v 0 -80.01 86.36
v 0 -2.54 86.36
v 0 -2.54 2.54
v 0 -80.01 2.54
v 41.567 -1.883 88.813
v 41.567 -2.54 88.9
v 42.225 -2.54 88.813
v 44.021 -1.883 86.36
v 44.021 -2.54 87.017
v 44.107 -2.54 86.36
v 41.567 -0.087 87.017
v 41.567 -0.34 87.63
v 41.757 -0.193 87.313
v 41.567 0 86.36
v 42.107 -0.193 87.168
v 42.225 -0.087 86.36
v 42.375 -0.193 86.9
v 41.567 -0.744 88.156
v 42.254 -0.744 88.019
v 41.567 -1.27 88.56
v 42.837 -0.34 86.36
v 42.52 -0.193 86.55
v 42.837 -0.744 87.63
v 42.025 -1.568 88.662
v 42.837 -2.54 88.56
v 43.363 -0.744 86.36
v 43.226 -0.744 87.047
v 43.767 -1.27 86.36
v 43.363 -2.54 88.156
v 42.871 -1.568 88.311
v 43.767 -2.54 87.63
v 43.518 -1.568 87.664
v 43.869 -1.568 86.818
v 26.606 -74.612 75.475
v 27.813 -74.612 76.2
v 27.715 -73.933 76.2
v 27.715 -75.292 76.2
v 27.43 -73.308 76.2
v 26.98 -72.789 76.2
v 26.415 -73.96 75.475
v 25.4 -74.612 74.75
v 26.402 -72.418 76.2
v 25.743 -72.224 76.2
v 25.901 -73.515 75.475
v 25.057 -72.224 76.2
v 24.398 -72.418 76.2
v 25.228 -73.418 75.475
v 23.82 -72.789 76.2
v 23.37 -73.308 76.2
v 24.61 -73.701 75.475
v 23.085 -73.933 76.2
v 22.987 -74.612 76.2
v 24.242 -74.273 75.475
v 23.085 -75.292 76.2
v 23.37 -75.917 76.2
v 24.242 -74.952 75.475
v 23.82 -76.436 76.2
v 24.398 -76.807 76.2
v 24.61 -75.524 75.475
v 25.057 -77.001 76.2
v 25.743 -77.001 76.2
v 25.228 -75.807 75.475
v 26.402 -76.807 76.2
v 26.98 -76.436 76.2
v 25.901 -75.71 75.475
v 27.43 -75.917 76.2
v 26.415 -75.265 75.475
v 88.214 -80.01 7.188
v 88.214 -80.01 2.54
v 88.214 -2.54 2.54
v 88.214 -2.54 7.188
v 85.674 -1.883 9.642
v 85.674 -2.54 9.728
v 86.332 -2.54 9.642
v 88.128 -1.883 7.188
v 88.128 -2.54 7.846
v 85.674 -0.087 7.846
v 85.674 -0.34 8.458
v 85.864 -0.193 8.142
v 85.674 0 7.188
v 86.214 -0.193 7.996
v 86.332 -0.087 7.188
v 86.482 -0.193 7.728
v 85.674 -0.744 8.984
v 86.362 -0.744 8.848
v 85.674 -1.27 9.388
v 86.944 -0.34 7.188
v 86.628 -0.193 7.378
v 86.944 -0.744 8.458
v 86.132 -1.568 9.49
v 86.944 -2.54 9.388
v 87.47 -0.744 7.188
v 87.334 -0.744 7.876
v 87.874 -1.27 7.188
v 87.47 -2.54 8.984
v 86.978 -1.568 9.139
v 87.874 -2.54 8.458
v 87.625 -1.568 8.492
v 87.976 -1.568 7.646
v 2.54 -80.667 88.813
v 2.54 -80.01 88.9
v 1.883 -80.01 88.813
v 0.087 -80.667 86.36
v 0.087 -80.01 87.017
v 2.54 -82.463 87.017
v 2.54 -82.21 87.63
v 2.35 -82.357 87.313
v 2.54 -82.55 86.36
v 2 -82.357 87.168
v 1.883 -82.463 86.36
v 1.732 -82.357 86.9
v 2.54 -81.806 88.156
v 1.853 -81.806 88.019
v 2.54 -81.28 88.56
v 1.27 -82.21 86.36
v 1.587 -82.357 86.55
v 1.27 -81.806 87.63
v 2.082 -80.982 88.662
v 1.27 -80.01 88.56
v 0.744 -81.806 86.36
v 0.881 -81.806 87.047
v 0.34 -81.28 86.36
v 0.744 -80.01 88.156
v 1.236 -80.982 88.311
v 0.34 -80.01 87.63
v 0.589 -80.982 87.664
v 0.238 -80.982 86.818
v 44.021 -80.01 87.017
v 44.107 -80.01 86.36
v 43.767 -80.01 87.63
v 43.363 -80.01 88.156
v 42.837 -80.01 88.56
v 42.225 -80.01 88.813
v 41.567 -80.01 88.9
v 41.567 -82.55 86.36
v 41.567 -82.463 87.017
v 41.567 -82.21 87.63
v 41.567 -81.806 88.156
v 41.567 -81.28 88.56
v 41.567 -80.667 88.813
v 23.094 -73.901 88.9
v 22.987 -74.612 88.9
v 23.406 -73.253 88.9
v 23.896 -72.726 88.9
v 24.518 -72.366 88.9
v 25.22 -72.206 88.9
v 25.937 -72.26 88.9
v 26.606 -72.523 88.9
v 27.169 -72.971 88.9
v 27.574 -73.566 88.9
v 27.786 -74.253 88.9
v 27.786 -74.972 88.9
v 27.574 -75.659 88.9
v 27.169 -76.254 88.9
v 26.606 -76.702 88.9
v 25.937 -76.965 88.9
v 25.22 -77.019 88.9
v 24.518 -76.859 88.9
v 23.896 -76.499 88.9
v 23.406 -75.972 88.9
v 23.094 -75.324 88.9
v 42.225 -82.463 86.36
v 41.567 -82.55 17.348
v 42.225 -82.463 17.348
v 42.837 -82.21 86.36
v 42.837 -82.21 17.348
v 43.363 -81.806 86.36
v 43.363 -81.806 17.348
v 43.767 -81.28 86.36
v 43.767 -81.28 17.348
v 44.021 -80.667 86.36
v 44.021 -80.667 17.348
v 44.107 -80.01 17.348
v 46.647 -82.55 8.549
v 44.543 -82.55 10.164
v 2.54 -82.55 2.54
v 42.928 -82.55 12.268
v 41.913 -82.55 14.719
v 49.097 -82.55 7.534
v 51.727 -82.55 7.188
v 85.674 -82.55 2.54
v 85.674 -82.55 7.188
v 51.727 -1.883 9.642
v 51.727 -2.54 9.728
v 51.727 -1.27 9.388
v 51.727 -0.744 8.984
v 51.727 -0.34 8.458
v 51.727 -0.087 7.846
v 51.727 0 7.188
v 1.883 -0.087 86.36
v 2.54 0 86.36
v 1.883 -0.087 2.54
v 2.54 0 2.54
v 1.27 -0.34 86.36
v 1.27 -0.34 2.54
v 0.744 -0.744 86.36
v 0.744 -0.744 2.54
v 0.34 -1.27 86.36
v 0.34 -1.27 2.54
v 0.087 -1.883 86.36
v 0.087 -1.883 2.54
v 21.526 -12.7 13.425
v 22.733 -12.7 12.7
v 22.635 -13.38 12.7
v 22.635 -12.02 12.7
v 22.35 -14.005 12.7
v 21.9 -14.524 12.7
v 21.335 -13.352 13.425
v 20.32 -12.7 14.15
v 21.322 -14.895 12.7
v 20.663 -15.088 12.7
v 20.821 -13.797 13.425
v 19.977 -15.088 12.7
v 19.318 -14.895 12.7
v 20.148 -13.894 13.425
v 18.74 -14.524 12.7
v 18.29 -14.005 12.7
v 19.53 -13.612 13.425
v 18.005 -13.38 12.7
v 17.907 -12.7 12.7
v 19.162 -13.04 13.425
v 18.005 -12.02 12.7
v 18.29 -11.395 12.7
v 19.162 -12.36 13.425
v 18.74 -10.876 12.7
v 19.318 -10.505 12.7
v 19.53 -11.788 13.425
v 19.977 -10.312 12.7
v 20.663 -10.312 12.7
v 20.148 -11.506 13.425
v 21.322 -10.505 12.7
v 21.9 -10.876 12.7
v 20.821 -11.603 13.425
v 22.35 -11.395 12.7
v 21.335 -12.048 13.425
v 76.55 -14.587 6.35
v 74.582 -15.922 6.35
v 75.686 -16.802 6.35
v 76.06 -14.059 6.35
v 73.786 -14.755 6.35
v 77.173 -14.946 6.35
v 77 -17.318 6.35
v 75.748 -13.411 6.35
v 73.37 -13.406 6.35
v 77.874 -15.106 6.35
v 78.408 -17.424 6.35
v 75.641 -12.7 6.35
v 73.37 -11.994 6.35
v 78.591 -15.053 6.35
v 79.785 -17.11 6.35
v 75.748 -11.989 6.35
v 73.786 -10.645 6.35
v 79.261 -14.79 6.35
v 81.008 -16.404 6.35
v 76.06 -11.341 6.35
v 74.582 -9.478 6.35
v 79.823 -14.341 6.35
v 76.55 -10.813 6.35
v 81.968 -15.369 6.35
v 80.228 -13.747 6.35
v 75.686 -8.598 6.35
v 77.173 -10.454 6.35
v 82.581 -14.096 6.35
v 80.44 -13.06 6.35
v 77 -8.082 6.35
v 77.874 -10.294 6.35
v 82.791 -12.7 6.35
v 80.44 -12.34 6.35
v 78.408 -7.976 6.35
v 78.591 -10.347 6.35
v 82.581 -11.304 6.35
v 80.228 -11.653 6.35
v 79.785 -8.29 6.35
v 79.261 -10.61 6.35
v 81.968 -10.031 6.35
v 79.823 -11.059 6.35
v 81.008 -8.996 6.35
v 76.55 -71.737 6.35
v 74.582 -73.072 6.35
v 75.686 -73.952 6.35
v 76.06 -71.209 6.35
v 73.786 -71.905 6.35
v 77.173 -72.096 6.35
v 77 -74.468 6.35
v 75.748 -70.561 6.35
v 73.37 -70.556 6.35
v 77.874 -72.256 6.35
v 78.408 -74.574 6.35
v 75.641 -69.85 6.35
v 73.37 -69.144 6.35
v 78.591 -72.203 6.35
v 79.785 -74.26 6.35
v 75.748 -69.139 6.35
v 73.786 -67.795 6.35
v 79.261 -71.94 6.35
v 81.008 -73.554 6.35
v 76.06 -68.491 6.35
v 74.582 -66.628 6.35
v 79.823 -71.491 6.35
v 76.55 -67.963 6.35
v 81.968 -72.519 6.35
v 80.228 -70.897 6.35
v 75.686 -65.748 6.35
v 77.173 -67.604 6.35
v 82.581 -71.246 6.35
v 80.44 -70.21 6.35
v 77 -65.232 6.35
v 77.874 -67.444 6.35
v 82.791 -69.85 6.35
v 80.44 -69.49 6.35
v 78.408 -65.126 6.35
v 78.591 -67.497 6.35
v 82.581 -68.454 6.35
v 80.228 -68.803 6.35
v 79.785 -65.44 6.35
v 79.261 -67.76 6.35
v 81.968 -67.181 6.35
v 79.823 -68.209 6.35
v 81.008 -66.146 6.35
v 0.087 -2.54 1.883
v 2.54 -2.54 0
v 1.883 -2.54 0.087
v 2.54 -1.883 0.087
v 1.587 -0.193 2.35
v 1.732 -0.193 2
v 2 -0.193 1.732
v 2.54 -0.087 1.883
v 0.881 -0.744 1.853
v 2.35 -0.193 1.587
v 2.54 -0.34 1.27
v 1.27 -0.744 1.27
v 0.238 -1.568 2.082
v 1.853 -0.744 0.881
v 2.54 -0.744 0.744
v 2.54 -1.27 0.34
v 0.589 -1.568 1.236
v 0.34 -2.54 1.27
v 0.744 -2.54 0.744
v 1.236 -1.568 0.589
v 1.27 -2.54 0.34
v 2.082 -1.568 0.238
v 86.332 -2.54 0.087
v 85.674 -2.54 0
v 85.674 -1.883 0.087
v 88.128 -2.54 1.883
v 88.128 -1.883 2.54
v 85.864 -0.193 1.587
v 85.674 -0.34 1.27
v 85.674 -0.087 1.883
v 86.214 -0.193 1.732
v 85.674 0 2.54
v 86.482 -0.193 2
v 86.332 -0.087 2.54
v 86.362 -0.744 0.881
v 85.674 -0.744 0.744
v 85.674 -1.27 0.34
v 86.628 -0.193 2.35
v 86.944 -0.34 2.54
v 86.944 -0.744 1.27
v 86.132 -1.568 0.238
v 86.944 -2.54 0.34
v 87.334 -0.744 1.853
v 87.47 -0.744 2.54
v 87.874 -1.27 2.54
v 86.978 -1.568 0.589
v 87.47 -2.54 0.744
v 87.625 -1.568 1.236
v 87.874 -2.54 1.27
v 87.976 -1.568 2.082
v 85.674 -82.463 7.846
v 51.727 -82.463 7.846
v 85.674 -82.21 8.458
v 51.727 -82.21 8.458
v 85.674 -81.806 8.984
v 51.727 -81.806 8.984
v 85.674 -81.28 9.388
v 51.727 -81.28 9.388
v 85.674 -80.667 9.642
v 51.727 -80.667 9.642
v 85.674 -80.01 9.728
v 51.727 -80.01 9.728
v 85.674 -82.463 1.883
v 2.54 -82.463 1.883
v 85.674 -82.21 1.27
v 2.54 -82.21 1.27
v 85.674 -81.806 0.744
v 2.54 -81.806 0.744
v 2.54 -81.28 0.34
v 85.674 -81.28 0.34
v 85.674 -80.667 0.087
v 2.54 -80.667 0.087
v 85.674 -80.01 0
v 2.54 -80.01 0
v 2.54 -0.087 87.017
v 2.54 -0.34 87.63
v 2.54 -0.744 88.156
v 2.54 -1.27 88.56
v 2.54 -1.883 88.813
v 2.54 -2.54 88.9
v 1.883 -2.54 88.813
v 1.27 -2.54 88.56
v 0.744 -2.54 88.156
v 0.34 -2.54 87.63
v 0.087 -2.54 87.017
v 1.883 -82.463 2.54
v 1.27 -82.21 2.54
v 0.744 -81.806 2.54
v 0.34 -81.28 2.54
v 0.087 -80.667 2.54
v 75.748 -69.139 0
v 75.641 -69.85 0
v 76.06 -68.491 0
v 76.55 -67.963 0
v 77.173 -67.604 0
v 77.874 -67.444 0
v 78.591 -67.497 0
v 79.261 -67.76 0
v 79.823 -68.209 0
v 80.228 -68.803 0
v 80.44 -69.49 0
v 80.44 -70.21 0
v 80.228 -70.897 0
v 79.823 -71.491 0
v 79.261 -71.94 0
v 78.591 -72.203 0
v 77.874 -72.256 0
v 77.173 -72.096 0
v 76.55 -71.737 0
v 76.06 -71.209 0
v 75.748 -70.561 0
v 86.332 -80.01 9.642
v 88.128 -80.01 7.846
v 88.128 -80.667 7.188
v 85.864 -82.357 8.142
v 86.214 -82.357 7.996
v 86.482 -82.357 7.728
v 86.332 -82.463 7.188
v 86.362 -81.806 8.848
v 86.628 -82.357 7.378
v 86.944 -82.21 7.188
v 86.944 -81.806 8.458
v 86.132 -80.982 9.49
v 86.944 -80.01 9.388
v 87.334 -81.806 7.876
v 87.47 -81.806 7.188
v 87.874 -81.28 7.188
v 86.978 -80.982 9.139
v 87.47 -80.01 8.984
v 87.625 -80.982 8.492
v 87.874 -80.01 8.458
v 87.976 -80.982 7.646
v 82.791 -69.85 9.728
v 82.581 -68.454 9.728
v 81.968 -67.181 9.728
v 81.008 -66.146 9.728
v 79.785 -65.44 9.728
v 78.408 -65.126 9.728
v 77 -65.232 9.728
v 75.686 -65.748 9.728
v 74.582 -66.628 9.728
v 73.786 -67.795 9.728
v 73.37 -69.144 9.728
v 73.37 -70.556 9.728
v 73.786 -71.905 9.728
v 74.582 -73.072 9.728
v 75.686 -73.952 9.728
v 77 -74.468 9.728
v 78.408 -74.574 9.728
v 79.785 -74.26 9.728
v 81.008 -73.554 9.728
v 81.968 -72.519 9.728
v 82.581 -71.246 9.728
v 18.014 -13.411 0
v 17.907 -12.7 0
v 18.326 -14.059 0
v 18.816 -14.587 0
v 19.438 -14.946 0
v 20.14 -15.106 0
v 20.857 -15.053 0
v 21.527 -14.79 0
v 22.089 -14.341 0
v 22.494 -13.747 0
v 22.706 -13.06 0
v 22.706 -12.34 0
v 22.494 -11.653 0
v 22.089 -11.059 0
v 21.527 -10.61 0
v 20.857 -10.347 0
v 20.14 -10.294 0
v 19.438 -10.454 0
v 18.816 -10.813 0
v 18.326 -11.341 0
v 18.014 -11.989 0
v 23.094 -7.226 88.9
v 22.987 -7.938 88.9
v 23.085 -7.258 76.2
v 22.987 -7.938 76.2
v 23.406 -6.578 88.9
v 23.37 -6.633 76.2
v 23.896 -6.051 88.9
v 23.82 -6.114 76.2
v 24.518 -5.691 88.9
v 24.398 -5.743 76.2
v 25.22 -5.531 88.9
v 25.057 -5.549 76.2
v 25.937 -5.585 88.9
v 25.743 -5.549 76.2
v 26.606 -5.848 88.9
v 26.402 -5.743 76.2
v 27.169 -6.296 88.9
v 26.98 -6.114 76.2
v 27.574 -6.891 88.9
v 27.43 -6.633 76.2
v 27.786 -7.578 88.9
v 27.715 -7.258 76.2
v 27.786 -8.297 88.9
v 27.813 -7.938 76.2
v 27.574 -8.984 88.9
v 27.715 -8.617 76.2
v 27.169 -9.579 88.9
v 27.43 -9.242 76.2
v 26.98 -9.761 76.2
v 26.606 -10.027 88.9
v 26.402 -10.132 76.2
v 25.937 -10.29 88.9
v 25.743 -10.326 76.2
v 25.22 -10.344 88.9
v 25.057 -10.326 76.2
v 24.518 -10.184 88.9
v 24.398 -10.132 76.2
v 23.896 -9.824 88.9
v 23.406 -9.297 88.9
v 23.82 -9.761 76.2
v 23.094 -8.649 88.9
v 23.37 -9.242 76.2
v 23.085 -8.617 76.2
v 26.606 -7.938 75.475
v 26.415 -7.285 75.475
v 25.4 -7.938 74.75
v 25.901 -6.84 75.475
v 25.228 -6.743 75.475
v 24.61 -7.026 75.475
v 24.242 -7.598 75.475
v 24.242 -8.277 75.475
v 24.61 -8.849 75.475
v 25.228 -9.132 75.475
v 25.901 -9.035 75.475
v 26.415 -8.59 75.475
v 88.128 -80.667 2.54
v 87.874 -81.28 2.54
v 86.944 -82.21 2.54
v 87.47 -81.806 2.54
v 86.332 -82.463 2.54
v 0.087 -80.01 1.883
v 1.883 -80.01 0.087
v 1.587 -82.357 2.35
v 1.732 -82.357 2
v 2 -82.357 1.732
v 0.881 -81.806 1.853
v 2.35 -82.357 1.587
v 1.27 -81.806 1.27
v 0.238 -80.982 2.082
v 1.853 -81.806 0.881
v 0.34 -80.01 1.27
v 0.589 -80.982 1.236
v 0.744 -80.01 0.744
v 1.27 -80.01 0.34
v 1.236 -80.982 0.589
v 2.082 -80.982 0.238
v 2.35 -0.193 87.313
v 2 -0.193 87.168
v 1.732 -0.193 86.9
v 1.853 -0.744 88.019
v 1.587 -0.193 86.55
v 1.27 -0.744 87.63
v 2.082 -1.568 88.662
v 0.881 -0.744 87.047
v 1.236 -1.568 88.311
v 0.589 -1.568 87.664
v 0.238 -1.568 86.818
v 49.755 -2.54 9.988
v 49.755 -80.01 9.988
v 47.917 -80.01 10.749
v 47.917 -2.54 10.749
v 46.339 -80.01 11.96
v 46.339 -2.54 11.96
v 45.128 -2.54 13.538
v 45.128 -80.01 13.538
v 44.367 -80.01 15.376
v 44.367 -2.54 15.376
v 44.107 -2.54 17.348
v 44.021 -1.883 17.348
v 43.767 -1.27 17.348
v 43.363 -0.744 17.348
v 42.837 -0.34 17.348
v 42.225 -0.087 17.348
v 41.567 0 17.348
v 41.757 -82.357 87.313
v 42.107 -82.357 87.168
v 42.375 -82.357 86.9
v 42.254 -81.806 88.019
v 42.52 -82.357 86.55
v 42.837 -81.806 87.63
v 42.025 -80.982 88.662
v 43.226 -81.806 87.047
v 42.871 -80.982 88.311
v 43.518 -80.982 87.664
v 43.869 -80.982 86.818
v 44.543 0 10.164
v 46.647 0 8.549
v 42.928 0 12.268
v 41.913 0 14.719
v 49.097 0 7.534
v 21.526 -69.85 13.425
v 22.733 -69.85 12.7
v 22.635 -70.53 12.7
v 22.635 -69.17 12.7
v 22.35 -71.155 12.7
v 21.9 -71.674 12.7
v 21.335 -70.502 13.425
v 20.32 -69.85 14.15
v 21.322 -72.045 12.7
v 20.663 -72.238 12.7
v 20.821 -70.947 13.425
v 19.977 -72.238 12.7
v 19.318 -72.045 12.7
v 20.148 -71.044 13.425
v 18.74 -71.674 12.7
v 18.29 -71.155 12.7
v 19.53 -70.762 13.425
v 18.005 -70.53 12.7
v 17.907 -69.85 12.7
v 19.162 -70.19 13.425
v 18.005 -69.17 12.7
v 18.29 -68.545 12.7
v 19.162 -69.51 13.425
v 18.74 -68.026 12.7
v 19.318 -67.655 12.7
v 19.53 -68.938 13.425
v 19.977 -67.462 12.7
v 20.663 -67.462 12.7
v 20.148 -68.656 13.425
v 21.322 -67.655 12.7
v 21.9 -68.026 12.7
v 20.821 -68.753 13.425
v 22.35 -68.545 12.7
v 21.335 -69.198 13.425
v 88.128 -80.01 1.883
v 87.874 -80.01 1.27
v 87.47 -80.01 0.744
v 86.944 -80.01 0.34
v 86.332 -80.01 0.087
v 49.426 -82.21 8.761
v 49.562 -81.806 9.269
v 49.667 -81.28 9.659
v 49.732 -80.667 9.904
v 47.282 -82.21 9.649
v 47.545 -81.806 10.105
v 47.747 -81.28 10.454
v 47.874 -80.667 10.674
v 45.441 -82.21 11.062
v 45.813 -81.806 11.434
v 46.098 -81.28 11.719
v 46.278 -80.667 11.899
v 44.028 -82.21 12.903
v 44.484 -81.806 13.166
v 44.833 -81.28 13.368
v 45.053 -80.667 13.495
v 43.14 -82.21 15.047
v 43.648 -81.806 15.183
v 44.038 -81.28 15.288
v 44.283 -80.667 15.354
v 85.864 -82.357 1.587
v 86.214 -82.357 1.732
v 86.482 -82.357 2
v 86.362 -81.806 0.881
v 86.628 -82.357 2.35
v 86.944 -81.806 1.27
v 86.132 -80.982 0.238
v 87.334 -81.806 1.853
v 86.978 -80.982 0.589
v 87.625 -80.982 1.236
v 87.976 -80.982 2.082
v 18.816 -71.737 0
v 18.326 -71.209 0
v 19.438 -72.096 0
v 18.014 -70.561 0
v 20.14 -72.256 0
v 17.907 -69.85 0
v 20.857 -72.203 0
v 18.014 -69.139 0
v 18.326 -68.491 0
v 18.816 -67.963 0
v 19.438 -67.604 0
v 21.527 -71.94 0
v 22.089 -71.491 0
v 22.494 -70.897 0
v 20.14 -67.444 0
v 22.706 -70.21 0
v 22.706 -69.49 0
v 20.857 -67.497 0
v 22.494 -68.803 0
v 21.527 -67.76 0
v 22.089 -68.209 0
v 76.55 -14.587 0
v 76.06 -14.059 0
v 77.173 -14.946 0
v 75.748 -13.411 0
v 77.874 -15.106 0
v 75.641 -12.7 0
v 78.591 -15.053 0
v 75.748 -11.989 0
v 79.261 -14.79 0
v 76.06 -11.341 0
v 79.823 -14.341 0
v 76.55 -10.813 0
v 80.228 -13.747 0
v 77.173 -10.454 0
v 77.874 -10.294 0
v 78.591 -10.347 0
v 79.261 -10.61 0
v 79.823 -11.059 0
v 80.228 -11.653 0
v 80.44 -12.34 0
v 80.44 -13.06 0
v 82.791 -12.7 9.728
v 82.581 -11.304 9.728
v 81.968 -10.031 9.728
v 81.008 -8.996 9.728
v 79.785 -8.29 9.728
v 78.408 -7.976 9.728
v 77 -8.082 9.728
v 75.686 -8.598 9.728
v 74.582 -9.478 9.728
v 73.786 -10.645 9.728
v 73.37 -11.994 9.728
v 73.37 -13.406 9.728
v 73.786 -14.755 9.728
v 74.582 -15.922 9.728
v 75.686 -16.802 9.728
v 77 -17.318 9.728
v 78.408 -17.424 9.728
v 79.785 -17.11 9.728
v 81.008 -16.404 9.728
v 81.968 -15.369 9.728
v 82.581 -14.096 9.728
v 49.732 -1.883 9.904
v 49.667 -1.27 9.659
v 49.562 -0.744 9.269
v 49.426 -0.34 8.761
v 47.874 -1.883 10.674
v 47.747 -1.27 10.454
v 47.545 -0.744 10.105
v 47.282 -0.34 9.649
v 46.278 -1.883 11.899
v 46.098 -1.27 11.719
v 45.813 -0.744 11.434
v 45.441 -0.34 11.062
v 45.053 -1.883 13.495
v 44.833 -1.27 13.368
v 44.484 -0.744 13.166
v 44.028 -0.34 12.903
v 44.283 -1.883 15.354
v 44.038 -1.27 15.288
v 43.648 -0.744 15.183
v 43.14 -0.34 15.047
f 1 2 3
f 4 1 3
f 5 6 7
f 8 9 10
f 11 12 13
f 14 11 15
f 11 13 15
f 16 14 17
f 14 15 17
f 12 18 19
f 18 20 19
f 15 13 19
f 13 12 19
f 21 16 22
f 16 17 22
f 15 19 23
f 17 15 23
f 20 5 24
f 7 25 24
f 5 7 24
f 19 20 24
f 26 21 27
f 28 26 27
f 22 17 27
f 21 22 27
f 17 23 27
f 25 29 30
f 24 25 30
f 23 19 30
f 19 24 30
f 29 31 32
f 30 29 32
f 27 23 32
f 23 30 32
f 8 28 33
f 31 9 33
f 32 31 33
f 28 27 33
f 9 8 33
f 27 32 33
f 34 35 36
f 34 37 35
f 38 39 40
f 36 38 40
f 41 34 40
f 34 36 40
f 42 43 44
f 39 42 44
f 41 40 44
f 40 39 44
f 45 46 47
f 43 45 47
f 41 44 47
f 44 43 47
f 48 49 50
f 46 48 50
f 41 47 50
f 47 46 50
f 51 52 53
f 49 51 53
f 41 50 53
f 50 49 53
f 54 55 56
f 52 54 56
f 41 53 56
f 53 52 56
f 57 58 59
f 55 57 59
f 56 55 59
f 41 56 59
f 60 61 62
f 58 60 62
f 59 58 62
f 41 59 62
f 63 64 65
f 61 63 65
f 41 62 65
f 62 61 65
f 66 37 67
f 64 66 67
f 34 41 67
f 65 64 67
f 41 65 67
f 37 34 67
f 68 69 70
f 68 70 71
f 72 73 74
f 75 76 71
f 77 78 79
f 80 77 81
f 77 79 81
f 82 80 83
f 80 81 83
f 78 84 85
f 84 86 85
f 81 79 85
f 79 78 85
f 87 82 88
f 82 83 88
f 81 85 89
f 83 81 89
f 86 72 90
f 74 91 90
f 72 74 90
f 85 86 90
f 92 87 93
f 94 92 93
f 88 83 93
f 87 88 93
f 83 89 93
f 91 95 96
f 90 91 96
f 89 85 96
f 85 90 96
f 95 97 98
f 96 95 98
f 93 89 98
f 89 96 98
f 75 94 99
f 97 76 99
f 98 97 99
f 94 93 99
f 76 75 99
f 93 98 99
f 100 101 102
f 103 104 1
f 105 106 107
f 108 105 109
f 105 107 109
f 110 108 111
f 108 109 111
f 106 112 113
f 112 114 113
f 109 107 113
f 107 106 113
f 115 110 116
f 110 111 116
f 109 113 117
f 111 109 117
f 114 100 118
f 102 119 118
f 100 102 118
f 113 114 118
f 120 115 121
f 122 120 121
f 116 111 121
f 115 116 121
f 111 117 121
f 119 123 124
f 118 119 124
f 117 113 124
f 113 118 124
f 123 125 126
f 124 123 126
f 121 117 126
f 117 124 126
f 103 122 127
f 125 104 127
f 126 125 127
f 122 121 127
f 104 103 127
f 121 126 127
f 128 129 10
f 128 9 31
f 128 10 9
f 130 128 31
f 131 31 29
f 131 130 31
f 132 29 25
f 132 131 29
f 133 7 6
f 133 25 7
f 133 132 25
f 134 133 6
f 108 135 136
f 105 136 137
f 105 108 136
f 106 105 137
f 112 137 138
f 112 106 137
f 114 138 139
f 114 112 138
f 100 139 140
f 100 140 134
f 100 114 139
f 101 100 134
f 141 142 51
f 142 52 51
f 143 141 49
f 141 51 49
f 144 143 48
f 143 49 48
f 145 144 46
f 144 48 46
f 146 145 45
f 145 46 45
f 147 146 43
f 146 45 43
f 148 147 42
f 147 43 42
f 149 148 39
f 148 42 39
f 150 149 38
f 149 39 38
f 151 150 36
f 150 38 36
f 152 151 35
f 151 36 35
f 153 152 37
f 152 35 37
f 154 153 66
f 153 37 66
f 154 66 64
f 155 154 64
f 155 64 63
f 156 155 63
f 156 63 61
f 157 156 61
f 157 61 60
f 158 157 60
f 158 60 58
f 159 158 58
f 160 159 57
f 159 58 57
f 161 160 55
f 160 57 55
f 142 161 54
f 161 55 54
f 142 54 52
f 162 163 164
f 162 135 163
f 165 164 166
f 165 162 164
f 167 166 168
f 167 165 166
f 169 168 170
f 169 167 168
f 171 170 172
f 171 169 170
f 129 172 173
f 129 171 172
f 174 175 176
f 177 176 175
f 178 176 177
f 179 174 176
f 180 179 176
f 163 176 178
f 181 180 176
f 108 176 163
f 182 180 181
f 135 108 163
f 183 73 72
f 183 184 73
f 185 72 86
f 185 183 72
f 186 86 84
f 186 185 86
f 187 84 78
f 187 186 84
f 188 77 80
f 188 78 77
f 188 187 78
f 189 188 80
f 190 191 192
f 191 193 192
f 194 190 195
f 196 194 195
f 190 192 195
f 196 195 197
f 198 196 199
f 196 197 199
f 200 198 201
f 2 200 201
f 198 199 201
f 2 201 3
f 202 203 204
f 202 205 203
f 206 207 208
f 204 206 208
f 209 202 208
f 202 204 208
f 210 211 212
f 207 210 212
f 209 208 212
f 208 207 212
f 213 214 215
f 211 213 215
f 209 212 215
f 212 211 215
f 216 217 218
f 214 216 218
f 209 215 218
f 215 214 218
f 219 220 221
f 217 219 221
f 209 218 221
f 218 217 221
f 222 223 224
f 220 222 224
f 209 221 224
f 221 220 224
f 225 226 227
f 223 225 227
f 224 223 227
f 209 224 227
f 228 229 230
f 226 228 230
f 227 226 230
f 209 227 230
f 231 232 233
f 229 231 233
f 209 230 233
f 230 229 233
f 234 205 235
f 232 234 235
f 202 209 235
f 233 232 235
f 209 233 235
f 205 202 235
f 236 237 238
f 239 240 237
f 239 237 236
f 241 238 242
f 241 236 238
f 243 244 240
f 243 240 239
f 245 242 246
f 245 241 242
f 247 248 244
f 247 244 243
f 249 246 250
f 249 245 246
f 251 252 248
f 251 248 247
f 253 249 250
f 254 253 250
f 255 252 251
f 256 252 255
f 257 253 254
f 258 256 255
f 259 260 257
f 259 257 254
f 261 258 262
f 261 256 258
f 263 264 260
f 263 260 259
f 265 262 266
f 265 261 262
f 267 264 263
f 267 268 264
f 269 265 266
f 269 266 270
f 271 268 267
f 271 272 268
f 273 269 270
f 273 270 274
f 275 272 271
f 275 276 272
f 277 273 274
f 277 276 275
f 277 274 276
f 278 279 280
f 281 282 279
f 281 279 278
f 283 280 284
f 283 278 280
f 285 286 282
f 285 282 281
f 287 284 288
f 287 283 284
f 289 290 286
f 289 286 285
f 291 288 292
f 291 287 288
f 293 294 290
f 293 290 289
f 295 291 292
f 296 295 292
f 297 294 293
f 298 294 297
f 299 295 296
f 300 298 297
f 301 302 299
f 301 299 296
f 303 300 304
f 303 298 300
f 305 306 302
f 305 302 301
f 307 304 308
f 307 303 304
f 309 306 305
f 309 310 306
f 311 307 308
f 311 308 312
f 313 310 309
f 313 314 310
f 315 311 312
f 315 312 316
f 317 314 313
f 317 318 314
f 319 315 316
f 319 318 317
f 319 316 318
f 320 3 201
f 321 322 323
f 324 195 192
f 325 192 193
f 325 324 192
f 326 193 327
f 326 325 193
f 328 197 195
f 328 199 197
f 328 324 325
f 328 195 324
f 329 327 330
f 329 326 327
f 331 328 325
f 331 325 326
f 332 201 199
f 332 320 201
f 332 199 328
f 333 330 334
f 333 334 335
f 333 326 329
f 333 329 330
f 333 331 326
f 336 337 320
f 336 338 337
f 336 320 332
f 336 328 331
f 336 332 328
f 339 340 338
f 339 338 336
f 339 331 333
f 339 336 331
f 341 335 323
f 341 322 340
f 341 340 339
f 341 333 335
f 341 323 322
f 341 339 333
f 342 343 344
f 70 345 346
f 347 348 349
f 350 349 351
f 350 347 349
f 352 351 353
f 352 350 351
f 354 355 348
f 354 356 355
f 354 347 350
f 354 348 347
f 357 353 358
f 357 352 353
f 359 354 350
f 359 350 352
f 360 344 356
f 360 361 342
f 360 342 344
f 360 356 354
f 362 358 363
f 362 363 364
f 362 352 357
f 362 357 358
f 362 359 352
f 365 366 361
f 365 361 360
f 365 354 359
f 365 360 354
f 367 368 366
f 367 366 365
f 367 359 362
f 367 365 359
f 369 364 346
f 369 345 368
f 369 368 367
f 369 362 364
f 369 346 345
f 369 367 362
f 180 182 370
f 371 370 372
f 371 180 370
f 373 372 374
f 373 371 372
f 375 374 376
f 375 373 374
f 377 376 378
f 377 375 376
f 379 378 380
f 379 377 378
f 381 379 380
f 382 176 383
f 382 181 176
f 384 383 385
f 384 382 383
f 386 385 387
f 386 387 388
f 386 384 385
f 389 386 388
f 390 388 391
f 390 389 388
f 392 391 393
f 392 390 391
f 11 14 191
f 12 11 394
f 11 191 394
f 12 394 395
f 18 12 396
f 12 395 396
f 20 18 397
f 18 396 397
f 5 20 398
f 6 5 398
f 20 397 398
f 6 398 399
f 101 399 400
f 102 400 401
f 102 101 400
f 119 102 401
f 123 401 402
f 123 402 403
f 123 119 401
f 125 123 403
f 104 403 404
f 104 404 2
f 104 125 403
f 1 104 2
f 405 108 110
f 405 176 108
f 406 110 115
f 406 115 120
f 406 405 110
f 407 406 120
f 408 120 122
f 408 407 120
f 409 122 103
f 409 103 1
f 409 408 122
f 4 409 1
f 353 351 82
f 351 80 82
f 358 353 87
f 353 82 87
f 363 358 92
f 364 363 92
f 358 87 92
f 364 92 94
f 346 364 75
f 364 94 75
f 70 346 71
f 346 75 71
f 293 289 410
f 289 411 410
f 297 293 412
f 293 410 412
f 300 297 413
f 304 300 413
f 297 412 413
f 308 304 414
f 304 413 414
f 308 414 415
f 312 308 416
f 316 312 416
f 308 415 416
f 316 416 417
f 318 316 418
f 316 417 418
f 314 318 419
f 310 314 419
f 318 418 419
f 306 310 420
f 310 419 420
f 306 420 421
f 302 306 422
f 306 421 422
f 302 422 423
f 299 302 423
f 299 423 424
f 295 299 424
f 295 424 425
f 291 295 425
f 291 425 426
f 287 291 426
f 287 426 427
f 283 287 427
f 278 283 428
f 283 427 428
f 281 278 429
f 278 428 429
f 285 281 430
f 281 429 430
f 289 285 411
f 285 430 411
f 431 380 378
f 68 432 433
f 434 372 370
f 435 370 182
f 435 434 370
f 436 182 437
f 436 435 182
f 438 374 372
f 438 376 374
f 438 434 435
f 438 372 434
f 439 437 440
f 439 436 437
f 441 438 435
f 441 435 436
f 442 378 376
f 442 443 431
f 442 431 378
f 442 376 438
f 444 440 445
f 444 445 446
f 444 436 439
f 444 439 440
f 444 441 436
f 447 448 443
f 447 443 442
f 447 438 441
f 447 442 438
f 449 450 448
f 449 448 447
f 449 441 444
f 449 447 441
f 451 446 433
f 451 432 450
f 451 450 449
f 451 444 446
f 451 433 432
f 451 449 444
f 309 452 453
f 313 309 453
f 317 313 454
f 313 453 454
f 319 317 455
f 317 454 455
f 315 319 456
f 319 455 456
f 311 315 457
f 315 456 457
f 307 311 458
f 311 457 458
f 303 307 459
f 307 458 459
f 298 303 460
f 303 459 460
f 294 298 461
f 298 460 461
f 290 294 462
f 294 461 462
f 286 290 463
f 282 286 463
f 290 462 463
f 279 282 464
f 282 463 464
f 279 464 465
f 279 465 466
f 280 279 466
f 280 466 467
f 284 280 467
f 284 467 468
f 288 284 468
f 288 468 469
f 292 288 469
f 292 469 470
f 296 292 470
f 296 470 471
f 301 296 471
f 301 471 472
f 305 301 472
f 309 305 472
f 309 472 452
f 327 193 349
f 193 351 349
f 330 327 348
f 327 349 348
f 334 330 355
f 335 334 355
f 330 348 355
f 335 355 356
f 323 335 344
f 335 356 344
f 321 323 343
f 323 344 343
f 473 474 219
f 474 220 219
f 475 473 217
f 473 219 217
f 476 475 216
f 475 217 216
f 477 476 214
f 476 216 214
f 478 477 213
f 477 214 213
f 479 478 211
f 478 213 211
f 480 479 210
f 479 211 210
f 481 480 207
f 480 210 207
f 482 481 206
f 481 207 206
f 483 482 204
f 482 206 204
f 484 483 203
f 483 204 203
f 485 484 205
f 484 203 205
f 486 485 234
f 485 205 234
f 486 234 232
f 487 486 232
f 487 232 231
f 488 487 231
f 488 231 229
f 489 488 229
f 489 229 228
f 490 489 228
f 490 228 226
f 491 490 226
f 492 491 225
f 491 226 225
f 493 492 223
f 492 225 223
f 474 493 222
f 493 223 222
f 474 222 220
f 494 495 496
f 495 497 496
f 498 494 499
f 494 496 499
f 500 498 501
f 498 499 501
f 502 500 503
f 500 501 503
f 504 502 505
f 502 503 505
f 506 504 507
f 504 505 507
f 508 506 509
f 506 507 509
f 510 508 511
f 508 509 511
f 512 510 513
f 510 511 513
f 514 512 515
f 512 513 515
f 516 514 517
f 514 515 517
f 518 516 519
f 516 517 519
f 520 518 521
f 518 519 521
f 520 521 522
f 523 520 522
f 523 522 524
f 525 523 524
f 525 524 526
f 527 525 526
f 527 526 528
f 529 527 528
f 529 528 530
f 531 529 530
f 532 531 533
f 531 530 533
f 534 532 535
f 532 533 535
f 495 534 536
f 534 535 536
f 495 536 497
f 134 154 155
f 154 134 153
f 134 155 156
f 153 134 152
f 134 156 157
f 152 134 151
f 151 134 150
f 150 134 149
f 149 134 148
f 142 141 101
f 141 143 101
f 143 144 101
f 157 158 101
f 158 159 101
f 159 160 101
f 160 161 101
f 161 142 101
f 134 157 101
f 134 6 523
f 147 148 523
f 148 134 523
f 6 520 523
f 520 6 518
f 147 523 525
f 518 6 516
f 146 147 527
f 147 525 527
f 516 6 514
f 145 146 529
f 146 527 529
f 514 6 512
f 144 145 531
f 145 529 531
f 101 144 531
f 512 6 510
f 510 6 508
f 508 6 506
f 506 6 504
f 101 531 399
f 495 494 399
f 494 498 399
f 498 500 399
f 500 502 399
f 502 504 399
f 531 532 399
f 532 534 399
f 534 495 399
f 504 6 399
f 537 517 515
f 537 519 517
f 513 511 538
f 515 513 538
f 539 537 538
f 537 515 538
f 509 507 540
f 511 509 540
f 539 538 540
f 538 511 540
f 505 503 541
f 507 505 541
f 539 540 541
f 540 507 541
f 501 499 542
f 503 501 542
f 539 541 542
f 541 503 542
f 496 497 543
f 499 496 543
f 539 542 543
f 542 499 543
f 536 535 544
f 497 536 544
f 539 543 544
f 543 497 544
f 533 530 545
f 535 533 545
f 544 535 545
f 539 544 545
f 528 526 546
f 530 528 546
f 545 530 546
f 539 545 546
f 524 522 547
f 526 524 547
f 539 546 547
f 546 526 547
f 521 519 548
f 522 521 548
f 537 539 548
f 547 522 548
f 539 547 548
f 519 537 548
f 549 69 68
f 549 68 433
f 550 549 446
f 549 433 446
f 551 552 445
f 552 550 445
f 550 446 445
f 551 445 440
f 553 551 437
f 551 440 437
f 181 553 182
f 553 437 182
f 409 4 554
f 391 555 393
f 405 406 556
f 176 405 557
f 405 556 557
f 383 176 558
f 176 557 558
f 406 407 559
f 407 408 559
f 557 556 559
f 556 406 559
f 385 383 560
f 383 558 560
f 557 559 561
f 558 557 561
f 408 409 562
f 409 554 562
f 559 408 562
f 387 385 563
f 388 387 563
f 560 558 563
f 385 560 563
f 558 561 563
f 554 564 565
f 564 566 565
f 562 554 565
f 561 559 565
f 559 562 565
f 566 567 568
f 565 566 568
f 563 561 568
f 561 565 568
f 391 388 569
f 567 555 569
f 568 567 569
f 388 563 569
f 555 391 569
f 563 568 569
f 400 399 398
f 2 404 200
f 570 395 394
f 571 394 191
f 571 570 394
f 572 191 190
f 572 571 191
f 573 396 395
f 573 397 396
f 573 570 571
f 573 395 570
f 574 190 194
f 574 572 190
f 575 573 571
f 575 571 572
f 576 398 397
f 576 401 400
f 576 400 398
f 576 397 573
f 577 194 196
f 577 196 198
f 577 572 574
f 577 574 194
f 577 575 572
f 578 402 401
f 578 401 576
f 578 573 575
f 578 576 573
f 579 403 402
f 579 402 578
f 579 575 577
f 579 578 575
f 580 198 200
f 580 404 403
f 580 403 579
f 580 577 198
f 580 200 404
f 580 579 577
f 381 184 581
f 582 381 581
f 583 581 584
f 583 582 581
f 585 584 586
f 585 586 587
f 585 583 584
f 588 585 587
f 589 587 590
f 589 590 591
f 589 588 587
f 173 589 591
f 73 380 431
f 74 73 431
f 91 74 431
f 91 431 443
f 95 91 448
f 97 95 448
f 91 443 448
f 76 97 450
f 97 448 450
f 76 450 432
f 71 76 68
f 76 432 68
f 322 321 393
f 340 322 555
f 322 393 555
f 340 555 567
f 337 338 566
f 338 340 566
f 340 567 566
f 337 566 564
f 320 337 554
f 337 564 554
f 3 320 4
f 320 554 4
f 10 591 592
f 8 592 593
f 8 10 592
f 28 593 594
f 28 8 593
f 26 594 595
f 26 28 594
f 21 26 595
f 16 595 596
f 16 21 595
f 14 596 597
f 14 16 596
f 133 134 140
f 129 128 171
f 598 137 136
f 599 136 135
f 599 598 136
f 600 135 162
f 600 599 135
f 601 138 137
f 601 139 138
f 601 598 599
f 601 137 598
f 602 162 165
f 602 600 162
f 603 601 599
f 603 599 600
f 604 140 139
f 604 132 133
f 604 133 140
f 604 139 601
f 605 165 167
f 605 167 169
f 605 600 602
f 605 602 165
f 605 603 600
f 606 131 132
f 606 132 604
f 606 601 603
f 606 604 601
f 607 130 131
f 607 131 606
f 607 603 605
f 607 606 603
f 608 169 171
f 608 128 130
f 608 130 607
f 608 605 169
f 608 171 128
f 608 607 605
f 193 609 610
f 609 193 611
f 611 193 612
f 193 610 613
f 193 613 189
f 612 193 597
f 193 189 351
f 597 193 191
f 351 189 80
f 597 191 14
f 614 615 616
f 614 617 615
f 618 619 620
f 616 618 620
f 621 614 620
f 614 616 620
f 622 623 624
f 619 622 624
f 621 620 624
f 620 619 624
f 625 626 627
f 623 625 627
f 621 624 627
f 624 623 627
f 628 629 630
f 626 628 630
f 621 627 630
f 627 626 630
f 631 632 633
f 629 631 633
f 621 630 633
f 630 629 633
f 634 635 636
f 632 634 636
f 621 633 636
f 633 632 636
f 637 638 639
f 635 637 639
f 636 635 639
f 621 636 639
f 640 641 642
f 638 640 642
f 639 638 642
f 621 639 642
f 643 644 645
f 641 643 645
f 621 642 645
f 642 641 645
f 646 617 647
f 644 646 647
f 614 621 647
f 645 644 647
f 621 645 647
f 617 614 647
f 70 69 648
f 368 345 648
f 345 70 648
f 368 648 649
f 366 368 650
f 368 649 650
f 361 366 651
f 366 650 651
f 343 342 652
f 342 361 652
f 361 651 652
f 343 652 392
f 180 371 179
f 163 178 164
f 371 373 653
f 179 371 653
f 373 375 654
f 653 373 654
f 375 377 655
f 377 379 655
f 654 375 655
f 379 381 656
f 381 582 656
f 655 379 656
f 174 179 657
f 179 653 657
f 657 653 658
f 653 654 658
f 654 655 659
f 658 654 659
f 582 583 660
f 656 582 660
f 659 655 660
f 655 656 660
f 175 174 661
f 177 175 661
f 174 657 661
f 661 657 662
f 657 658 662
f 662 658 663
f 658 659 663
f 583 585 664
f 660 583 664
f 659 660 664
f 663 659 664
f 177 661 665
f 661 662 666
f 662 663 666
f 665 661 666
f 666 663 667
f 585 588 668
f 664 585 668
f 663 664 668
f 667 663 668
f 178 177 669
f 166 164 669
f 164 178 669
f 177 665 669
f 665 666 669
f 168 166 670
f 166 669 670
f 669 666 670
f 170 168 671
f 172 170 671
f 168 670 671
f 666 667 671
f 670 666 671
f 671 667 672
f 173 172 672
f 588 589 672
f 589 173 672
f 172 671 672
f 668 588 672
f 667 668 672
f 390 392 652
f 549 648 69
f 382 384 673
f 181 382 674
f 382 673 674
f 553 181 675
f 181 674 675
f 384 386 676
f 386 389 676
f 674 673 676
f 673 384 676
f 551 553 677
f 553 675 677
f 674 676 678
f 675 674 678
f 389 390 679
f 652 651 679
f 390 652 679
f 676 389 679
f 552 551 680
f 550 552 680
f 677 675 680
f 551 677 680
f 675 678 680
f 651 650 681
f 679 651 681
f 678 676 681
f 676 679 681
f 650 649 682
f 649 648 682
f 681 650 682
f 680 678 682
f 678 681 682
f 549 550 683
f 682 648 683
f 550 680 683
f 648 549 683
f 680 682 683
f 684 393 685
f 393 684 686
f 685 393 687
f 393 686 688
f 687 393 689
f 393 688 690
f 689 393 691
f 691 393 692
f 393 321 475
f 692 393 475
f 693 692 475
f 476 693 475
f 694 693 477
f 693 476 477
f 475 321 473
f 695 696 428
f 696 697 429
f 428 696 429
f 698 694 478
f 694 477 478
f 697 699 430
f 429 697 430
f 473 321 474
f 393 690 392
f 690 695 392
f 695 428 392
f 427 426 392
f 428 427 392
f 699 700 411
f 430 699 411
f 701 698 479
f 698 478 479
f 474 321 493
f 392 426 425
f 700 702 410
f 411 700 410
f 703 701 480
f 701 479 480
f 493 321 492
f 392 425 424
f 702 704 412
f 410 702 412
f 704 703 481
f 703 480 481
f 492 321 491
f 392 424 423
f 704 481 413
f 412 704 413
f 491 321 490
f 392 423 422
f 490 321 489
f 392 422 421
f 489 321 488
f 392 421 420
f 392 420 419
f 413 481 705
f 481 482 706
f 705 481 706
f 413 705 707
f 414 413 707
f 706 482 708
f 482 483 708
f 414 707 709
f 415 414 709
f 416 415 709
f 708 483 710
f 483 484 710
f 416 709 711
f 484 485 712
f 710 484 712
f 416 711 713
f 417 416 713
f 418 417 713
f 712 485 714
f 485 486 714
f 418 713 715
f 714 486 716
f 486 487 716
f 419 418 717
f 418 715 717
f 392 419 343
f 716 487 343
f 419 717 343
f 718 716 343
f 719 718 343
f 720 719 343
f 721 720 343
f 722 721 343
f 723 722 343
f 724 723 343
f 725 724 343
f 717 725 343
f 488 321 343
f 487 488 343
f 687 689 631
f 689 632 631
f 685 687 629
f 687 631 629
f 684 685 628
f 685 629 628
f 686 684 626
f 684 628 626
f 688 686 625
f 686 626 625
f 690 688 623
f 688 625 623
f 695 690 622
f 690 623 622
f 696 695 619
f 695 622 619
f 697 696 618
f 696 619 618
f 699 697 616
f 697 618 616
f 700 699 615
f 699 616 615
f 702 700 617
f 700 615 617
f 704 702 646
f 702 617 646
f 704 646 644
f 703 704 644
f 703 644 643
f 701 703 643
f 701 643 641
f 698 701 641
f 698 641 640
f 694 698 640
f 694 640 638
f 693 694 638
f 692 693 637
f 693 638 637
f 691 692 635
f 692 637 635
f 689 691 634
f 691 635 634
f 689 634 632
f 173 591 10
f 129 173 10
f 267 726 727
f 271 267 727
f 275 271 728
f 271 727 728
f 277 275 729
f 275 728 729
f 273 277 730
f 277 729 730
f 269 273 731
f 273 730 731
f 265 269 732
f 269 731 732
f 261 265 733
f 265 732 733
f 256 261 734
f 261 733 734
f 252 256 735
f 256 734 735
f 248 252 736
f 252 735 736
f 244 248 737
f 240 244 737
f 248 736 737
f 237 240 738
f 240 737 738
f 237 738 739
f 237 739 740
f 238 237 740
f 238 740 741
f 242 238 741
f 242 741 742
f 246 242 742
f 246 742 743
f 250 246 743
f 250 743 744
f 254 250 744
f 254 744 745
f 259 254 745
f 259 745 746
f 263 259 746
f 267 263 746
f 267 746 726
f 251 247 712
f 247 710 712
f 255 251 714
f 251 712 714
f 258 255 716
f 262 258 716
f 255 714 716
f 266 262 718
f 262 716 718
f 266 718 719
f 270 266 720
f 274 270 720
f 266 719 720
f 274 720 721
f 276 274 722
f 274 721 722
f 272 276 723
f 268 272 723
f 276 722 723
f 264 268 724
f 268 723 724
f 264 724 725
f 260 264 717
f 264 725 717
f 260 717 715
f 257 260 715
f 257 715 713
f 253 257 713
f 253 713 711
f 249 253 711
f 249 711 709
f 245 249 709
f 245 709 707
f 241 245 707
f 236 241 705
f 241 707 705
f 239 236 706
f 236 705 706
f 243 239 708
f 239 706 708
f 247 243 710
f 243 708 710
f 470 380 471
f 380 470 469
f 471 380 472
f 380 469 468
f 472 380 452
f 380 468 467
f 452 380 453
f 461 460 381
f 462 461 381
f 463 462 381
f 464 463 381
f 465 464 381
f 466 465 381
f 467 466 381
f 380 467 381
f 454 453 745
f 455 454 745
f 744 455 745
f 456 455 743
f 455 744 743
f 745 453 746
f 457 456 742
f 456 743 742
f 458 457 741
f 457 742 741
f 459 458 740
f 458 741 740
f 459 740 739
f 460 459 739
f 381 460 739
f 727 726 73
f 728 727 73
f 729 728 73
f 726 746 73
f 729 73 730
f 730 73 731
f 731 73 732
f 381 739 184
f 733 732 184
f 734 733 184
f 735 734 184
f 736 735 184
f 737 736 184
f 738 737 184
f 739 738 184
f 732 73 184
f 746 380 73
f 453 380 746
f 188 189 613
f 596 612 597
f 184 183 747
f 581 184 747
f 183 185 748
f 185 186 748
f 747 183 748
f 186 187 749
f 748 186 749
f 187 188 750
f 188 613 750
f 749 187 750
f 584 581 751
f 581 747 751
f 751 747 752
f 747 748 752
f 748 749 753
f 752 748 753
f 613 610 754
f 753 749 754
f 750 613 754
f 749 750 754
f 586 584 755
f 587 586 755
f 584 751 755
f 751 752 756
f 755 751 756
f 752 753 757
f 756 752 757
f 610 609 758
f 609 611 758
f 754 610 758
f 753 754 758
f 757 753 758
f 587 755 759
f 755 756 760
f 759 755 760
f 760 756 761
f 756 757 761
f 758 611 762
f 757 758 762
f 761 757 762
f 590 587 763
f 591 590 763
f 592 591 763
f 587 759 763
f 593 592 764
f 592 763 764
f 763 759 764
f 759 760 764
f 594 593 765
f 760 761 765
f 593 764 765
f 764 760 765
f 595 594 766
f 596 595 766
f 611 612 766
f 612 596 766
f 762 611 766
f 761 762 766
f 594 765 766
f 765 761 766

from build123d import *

# Parameters (mm, degrees)
F1_DEPTH       = 82.55
F2_R           = 7.62
F3_R           = 2.54
F6_D           = 4.826
F6_DEPTH       = 12.7
F6_TIP         = 1.4498766737
F6_ON_F5_D     = 4.826
F6_ON_F5_DEPTH = 12.7
F6_ON_F5_TIP   = 1.4498766737
F8_D           = 4.826
F8_CBORE_D     = 9.4742
F8_CBORE_DEPTH = 3.3782


with BuildPart() as f1:
    # F0 (on Front) → F1 (new body)
    with BuildSketch(Plane.XZ):
        Polygon((0, 88.9), (0, 0), (88.2142, 0), (88.2142, 9.7282), (44.1071, 9.7282), (44.1071, 88.9), align=None)
    extrude(amount=F1_DEPTH)

    # F2
    f2_edges = [f1.edges().sort_by_distance(p)[0] for p in [
        (44.1071, -41.275, 9.7282),
    ]]
    fillet(f2_edges, radius=F2_R)

    # F3
    f3_edges = [f1.edges().sort_by_distance(p)[0] for p in [
        (44.1071, -41.275, 88.9),
        (0, -41.275, 88.9),
        (0, -41.275, 0),
        (88.2142, -41.275, 9.7282),
        (88.2142, -41.275, 0),
        (22.05355, 0, 88.9),
        (22.05355, -82.55, 88.9),
        (44.1071, -82.55, 53.1241),
        (69.97065, -82.55, 9.7282),
        (69.97065, 0, 9.7282),
        (44.1071, 0, 53.1241),
        (0, 0, 44.45),
        (44.1071, 0, 0),
        (0, -82.55, 44.45),
        (44.1071, -82.55, 0),
        (88.2142, -82.55, 4.8641),
        (88.2142, 0, 4.8641),
    ]]
    fillet(f3_edges, radius=F3_R)

    # F6
    with Locations(Plane.XY.offset(88.9)):
        with Locations((25.4, -7.9375), (25.4, -74.6125)):
            Hole(F6_D / 2, depth=F6_DEPTH)
            with Locations((0, 0, -(F6_DEPTH + F6_TIP / 2))):  # 118° drill point
                Cone(0, F6_D / 2, F6_TIP, mode=Mode.SUBTRACT)

    # F6 on F5
    with Locations(Plane(origin=(0, 0, 0), x_dir=(1, 0, 0), z_dir=(0, 0, -1))):
        with Locations((20.32, 69.85), (20.32, 12.7)):
            Hole(F6_ON_F5_D / 2, depth=F6_ON_F5_DEPTH)
            with Locations((0, 0, -(F6_ON_F5_DEPTH + F6_ON_F5_TIP / 2))):  # 118° drill point
                Cone(0, F6_ON_F5_D / 2, F6_ON_F5_TIP, mode=Mode.SUBTRACT)

    # F8 (through all)
    with Locations(Plane.XY.offset(9.7282)):
        with Locations((78.0542, -12.7), (78.0542, -69.85)):
            CounterBoreHole(F8_D / 2, F8_CBORE_D / 2, F8_CBORE_DEPTH)


solid = f1.part
